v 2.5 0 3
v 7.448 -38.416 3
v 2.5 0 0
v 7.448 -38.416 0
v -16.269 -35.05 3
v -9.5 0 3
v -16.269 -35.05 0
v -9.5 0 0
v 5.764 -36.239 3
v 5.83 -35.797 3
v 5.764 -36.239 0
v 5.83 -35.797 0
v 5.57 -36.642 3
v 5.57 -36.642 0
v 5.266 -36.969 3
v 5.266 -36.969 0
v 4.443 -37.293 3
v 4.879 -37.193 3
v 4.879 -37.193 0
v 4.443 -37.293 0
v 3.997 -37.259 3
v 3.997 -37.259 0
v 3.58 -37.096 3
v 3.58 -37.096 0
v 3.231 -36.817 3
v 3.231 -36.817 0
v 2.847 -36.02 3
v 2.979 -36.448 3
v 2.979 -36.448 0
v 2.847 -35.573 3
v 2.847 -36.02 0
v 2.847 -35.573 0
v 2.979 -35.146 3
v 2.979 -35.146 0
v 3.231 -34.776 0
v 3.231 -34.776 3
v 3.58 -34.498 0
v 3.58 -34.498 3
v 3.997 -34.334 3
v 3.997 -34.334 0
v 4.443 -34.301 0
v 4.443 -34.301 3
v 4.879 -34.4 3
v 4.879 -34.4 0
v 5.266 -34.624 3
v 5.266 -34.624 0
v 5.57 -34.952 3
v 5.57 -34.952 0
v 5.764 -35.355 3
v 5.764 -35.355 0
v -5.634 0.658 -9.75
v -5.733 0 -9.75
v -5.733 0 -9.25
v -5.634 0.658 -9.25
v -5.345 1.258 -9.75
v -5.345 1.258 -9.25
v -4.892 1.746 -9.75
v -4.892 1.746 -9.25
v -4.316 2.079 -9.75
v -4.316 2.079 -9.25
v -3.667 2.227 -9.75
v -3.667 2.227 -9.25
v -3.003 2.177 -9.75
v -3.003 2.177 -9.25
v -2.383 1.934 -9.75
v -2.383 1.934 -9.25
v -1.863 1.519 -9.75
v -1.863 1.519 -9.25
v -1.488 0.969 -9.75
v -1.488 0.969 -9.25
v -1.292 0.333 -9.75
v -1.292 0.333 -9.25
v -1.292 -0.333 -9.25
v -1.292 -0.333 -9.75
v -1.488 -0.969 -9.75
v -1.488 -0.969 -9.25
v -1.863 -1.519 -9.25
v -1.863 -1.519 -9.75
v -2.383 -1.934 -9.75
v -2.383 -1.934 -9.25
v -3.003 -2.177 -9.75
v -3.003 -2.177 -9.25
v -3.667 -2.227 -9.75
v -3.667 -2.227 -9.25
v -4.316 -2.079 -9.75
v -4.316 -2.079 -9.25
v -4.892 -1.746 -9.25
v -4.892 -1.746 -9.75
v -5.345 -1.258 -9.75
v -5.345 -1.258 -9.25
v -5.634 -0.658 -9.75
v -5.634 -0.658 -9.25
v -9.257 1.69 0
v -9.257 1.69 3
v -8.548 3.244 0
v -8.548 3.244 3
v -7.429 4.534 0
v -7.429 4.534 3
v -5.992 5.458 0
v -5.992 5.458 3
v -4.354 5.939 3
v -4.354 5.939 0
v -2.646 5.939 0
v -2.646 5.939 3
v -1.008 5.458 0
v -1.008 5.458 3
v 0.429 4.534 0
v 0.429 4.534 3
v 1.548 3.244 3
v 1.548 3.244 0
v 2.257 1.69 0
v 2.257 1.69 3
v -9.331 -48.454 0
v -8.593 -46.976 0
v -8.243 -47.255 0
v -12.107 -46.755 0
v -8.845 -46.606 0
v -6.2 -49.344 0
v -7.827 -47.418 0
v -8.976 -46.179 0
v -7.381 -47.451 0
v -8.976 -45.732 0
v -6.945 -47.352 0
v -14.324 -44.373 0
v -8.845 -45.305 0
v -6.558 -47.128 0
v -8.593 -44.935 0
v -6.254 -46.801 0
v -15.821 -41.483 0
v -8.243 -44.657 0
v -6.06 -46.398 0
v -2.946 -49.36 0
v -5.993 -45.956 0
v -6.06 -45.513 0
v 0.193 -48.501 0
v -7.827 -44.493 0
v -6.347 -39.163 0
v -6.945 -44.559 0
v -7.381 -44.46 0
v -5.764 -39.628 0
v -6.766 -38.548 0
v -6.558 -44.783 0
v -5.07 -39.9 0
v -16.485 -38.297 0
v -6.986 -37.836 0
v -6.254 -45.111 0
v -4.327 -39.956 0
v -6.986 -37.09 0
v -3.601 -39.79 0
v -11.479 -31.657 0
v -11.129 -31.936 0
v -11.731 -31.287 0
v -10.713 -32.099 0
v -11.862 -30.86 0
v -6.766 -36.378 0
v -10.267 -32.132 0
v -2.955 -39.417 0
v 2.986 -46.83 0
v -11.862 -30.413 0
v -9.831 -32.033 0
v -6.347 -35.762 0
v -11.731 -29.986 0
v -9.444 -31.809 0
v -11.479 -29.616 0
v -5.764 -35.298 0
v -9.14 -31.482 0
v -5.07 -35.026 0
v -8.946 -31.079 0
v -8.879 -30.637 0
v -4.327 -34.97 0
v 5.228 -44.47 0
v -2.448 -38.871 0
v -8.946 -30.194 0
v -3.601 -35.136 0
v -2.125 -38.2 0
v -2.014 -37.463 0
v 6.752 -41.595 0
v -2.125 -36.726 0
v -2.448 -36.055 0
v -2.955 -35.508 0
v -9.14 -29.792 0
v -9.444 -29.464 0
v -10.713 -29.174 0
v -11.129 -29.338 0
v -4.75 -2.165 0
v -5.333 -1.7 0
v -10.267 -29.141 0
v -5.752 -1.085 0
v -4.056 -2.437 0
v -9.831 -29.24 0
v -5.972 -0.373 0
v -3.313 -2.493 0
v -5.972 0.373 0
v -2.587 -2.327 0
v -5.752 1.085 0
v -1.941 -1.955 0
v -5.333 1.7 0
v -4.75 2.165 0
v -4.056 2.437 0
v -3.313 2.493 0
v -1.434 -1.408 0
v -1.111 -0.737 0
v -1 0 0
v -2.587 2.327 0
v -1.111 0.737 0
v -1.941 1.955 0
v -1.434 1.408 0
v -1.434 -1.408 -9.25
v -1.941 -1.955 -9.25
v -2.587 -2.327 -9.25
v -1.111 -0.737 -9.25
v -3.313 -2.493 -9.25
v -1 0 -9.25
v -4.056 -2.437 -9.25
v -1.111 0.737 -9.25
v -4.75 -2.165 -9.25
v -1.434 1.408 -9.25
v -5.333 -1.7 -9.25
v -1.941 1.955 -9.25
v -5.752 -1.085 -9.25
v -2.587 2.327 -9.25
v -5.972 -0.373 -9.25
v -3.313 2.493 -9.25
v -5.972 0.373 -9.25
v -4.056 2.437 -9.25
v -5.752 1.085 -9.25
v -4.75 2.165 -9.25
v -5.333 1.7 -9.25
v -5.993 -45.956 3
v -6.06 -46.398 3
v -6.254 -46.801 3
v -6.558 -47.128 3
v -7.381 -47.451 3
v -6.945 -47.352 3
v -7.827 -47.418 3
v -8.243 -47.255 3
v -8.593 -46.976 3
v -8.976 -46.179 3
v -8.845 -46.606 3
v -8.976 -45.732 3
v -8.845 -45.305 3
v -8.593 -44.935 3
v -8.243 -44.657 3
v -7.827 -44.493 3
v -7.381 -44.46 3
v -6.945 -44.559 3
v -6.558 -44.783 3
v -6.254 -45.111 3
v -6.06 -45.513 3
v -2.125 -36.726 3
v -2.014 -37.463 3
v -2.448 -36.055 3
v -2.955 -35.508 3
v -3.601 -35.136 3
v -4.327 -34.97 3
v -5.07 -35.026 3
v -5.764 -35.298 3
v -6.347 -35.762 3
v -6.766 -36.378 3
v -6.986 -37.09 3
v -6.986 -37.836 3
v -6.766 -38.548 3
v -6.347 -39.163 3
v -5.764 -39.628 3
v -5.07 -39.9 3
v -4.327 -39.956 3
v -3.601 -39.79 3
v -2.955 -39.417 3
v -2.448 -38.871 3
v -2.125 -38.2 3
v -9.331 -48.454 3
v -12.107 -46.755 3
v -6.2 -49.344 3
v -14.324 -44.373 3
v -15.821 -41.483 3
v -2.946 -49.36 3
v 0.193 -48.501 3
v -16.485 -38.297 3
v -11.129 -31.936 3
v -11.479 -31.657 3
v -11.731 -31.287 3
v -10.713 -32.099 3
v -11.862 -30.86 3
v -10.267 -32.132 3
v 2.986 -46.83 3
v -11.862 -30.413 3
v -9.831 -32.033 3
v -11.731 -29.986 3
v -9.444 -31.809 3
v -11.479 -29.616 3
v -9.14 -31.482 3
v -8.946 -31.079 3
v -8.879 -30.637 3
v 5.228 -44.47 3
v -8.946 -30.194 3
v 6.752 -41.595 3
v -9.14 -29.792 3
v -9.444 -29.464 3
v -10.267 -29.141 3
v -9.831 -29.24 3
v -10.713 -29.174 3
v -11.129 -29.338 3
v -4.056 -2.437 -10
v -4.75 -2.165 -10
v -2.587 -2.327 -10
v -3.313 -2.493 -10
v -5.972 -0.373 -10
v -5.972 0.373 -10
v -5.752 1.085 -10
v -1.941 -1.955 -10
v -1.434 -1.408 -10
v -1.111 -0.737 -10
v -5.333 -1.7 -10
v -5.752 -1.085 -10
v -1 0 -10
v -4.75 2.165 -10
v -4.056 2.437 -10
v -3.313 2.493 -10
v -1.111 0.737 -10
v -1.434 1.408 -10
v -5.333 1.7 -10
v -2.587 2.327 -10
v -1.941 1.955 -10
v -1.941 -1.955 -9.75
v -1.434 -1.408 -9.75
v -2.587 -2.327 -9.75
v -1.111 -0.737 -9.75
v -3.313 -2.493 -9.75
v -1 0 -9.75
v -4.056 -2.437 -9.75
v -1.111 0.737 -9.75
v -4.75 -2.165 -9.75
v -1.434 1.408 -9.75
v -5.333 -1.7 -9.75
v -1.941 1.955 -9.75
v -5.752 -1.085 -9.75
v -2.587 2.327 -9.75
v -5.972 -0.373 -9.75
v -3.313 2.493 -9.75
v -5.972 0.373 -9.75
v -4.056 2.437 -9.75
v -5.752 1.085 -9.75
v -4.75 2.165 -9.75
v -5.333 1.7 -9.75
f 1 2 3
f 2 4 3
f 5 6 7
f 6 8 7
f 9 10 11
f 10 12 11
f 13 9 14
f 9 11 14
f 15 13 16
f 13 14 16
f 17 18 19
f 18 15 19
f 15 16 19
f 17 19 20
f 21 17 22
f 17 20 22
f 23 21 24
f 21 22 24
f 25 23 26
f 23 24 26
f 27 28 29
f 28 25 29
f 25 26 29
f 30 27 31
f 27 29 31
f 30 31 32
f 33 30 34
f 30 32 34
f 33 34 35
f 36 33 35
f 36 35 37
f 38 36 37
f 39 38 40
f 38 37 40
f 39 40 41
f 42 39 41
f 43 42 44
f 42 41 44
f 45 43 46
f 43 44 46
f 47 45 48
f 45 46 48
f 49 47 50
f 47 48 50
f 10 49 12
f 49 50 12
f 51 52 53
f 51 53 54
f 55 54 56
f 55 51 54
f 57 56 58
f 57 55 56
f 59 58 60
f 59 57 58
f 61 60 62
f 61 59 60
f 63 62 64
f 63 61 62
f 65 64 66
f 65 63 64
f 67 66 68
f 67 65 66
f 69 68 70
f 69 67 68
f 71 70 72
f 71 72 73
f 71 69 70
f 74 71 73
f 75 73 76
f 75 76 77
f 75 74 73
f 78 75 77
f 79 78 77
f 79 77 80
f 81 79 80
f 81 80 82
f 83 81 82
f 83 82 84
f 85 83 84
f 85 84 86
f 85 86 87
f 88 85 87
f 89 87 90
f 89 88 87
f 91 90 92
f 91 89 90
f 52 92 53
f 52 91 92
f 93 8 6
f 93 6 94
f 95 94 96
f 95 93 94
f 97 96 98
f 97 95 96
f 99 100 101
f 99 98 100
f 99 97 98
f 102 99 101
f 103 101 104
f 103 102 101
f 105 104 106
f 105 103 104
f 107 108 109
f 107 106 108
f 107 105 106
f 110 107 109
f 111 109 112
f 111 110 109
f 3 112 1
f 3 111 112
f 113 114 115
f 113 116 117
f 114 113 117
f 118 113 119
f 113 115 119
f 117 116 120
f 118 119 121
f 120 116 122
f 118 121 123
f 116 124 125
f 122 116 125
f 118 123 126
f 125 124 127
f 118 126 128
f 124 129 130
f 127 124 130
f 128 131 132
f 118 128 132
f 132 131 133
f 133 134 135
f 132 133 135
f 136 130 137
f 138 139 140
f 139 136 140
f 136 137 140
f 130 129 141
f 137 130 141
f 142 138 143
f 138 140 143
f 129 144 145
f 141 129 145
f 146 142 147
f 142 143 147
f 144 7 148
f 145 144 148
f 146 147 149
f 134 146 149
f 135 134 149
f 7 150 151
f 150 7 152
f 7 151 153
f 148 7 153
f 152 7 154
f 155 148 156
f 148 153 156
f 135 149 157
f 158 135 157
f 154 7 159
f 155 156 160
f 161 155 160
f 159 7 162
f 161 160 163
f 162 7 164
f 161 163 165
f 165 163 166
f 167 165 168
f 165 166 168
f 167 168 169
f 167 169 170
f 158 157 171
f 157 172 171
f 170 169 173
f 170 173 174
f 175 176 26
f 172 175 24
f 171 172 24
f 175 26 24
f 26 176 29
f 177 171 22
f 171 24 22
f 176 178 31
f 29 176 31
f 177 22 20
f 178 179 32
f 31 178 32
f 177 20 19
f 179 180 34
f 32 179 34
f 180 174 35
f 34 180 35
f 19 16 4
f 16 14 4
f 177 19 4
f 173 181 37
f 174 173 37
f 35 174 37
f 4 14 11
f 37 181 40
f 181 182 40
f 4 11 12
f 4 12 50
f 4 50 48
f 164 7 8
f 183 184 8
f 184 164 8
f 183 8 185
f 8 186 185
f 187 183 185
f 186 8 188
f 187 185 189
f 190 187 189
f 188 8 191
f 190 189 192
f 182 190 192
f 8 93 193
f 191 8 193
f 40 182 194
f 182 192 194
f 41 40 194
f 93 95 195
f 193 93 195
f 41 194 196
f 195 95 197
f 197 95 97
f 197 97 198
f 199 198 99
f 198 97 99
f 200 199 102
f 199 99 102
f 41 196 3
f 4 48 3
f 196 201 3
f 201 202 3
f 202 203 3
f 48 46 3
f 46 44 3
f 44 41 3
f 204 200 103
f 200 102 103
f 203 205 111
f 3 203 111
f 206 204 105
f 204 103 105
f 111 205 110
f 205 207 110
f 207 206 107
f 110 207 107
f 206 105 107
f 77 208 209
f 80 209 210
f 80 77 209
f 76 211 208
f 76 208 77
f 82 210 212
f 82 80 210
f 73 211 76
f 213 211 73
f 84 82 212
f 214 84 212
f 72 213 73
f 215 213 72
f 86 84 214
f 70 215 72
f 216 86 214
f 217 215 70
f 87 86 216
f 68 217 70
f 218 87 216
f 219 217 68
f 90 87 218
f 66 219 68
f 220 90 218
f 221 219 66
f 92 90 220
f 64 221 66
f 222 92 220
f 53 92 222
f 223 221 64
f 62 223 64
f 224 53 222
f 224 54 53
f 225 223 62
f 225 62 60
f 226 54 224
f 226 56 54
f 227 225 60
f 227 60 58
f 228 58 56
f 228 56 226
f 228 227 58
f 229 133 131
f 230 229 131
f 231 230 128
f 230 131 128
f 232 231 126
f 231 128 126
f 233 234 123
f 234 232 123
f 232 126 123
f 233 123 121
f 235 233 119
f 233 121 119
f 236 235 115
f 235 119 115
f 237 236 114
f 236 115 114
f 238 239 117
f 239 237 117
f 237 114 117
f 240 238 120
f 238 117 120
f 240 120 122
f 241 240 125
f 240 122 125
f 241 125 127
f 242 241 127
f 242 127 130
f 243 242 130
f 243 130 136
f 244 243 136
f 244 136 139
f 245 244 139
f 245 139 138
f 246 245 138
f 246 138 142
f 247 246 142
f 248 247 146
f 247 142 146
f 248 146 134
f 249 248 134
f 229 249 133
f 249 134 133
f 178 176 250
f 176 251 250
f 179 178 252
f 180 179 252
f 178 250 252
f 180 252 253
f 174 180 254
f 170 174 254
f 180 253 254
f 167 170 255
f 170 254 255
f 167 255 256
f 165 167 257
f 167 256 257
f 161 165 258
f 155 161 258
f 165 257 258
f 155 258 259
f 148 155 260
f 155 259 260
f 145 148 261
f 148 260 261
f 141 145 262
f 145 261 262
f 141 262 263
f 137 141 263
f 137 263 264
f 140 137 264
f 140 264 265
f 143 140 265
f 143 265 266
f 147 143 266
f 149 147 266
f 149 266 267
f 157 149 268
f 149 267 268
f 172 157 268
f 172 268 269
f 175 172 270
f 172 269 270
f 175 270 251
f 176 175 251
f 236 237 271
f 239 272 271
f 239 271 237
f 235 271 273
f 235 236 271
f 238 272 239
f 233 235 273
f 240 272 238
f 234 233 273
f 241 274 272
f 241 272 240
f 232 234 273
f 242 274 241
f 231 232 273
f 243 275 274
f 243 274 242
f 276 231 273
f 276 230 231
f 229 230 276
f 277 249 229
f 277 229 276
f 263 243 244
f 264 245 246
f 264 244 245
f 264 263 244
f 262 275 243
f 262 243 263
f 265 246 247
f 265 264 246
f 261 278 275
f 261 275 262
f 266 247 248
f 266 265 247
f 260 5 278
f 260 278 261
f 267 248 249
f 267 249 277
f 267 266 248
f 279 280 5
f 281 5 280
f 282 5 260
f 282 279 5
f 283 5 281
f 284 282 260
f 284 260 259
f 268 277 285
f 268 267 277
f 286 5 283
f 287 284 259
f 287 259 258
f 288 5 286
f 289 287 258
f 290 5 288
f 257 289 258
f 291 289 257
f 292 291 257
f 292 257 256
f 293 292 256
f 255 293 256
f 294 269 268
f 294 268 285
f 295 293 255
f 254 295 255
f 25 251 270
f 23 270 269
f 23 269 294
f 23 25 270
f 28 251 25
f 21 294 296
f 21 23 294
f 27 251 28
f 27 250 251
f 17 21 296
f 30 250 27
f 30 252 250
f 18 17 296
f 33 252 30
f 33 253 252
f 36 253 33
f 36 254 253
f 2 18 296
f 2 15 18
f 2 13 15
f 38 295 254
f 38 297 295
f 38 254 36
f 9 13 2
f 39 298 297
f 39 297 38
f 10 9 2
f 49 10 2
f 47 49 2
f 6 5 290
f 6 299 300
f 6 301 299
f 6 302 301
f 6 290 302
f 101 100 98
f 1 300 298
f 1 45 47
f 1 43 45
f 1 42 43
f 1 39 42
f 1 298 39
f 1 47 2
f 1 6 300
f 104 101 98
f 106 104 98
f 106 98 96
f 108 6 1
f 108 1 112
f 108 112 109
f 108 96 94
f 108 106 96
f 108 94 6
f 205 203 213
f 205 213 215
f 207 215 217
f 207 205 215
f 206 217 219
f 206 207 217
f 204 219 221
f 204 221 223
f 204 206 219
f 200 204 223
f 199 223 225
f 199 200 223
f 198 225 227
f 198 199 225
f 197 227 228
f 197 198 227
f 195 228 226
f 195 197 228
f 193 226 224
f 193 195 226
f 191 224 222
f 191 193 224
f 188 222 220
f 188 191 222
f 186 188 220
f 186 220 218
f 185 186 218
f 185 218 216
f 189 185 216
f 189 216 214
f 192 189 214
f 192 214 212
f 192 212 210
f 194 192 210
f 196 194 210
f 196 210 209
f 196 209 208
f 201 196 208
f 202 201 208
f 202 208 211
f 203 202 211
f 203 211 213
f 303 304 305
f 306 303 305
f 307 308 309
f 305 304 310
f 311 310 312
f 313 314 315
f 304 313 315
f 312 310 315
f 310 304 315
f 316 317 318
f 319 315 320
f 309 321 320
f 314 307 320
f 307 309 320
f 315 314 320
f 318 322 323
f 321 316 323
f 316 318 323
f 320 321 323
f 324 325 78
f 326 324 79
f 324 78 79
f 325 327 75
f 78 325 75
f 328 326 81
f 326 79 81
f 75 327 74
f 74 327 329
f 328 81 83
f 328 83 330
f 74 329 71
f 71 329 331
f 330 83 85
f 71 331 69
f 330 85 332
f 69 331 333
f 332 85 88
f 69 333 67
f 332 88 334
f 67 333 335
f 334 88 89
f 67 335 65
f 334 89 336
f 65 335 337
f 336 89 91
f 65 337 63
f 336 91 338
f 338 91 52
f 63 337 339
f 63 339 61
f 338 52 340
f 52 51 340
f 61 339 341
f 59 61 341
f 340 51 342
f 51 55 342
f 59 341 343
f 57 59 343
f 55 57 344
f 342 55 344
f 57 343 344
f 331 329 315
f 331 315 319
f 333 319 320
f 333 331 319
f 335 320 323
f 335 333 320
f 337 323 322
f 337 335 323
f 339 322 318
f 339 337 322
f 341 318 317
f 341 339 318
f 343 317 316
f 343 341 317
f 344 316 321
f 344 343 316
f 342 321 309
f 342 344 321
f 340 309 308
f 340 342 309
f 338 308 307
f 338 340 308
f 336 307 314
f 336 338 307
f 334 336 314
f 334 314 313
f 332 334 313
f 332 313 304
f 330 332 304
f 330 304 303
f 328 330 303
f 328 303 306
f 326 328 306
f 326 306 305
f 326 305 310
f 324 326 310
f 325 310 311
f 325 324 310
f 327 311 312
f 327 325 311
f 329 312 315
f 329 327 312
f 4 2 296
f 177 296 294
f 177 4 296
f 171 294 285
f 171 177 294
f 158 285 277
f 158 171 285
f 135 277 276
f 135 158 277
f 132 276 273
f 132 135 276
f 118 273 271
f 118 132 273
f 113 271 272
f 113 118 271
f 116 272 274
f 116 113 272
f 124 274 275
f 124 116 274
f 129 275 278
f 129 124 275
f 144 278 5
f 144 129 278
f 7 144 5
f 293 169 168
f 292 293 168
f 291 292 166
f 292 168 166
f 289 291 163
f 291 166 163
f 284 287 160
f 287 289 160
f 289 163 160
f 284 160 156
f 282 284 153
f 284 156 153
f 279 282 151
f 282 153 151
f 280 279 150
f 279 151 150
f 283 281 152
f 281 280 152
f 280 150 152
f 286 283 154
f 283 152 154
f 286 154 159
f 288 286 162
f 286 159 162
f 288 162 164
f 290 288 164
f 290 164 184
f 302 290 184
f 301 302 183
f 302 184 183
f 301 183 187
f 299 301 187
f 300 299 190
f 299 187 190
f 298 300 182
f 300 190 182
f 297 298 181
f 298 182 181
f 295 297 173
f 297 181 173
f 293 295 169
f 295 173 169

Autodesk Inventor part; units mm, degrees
ref_plane "YZ Plane" through (0, 0, 0) normal (1, 0, 0) x (0, 1, 0)
ref_plane "XZ Plane" through (0, 0, 0) normal (0, 1, 0) x (-1, 0, 0)
sketch "Esquisse1" plane through (0, 0, 0) normal (0, 0, 1) x (1, 0, 0)
  circle A0 centre (-3.5, 0) radius 2.5 projected
  circle A1 centre (-3.5, 0) radius 2.5
  point P0 (0, 0)
ref_plane "Plan de construction1" through (-13, -9.5, -10) normal (0, 0, -1) x (0, 1, 0)
extrude "Extrusion1" add sketch "Esquisse1" against normal up to surface (10 mm away)
ref_plane "Plan de construction2" through (-3.5, 0, -9.5) normal (0, 0, -1) x (-1, 0, 0)
sketch "Esquisse2" plane through (-3.5, 0, -9.5) normal (0, 0, -1) x (-1, 0, 0)
  circle A0 centre (0, 0) radius 2.5
  circle A1 centre (0, 0) radius 2.2333
  point P0 (-3.5, 0)
extrude "Extrusion2" cut sketch "Esquisse2" along normal mid plane 0.5
sketch "Esquisxse8" plane through (-3.5, 0, 0) normal (0, 0, 1) x (1, 0, 0)
  circle A0 centre (-1.0139, -37.4629) radius 12 projected
  circle A1 centre (-6.8791, -30.6366) radius 1.5 projected
  circle A2 centre (-3.9931, -45.9556) radius 1.5 projected
  circle A3 centre (7.8305, -35.7967) radius 1.5 projected
  circle A4 centre (0, 0) radius 2.5 projected
  arc A5 (6, 0) -> (-6, 0) centre (0, 0) ccw
  arc A6 (-12.7687, -35.0496) -> (10.3163, -33.5099) centre (-1.0139, -37.4629) ccw
  circle A7 centre (-3.9931, -45.9556) radius 1.5
  circle A8 centre (-6.8791, -30.6366) radius 1.5
  circle A9 centre (7.8305, -35.7967) radius 1.5
  line L0 (10.9482, -38.4158) -> (6, 0)
  line L1 (-6, 0) -> (-12.8221, -35.3258)
  point P0 (3.5, 0)
  dimension "d15" = 12
extrude "Extrusion6" add sketch "Esquisxse8" along normal blind 3 contours L0 A0 | A0 L1 A5 L0 picked at (-1.038, -37.5266)
sketch "Esquisse9" plane through (-3.5, 0, 3) normal (0, 0, 1) x (1, 0, 0)
  circle A0 centre (0, 0) radius 2.5 projected
  circle A1 centre (0, 0) radius 2.5
  point P0 (3.5, 0)
extrude "Extrusion7" add sketch "Esquisse9" against normal blind 10
sketch "Esquisse11" plane through (-3.5, 0, 3) normal (0, 0, 1) x (1, 0, 0)
  circle A0 centre (-1.0139, -37.4629) radius 2.5
  point P0 (3.5, 0)
extrude "Extrusion8" cut sketch "Esquisse11" against normal blind 10
properties part number "bras_codeur"
